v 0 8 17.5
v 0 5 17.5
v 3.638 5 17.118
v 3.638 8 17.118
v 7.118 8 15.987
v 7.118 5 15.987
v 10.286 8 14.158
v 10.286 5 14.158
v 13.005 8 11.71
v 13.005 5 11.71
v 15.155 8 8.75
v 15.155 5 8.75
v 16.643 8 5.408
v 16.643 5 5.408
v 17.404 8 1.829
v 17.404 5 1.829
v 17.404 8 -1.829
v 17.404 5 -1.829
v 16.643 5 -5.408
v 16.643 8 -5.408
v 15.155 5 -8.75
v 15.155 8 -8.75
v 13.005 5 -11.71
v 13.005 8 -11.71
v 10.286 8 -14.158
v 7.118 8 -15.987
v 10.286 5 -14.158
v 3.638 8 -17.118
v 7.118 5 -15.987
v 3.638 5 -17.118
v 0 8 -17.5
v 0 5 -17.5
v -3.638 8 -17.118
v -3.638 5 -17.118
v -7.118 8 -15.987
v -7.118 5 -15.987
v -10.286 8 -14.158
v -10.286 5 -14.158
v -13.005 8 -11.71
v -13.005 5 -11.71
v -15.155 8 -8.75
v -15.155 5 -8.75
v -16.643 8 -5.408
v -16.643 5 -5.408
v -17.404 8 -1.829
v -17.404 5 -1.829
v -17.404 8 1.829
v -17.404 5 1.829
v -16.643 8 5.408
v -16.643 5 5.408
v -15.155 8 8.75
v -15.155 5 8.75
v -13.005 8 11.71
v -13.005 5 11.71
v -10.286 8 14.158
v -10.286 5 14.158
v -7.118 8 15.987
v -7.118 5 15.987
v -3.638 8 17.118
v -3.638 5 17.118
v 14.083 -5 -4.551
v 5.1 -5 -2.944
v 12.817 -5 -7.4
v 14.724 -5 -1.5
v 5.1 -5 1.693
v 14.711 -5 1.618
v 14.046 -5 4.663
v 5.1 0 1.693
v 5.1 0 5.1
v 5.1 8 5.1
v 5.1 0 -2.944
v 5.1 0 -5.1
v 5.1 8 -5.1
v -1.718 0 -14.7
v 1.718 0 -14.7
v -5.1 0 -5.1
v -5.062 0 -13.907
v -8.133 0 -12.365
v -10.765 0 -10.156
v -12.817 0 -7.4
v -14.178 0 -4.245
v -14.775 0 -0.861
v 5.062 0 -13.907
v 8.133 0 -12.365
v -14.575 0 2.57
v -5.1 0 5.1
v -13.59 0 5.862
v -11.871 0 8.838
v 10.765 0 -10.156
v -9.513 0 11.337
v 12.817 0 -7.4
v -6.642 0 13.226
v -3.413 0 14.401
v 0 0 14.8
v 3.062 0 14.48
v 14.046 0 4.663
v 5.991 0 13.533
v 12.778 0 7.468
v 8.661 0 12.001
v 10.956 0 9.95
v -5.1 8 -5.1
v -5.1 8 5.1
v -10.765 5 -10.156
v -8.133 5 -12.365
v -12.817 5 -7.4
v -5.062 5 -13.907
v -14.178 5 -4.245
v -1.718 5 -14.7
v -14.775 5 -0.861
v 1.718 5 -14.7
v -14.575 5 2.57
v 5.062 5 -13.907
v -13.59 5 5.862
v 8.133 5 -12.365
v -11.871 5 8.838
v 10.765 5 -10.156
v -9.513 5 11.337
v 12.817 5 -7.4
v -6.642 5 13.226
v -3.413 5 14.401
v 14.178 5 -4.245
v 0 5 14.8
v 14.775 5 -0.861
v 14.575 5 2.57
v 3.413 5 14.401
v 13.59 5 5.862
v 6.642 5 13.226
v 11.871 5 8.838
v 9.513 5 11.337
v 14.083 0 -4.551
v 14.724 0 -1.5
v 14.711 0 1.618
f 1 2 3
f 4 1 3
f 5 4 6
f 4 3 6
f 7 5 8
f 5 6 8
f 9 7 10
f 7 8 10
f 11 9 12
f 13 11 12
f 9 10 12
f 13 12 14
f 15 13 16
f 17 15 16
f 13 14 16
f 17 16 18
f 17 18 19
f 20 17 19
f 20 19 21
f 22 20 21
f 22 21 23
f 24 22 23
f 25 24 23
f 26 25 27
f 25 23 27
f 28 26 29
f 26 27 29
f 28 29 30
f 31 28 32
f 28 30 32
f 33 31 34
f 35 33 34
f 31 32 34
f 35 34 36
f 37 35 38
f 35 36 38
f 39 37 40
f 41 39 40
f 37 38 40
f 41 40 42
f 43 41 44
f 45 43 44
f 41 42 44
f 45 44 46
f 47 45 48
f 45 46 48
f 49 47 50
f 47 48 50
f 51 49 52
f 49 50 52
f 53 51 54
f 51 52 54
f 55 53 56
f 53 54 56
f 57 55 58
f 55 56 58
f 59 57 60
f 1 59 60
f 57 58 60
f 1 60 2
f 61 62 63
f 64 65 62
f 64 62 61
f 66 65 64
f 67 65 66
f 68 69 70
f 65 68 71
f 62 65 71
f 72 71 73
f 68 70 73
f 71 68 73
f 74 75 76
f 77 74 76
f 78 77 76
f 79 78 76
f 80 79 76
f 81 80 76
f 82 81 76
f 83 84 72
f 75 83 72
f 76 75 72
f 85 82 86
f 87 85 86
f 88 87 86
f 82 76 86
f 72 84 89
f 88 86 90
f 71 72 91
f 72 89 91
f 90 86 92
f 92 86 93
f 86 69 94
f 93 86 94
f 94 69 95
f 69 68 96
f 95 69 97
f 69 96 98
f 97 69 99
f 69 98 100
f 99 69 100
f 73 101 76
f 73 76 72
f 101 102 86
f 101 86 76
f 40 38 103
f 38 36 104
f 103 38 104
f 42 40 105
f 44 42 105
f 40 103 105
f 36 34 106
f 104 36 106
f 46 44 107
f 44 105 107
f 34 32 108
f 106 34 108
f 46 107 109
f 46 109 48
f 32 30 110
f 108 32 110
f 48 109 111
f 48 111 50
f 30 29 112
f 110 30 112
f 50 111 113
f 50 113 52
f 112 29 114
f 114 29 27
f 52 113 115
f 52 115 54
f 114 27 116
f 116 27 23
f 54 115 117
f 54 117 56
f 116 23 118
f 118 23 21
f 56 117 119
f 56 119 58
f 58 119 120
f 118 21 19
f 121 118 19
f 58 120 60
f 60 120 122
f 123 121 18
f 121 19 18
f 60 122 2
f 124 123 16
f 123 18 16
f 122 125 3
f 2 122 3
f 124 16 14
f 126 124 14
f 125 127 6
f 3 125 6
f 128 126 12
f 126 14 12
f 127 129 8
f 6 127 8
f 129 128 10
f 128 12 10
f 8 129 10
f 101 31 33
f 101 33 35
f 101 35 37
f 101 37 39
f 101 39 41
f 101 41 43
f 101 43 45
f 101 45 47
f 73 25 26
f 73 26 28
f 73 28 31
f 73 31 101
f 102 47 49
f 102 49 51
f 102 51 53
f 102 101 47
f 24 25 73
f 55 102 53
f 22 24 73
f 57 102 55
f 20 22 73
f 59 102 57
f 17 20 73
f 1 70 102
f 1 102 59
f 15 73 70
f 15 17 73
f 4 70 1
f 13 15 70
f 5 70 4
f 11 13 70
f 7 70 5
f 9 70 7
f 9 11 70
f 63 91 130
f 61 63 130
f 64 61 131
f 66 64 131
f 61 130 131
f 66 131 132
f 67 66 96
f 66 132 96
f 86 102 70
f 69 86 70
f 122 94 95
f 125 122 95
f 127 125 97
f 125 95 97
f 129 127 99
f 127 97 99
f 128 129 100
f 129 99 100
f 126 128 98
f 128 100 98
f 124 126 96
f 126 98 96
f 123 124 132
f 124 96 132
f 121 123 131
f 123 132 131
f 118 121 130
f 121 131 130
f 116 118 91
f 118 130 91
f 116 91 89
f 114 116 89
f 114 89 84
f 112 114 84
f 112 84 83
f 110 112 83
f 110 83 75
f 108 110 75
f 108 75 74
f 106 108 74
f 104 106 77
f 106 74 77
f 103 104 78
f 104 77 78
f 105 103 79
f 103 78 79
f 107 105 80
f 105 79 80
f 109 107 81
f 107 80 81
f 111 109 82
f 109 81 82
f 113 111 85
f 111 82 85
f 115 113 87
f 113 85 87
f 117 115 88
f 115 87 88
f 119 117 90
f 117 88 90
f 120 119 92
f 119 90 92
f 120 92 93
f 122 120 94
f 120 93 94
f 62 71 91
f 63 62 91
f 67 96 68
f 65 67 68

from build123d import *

# Parameters (mm, degrees)
SKETCH_1_R          = 14.8
EXTRUDE_1_DEPTH     = 5
SKETCH_2_R          = 17.5
EXTRUDE_2_DEPTH     = 3
SKETCH_3_W          = 10.2
SKETCH_3_H          = 10.2
CUT_EXTRUDE_1_DEPTH = 9
EXTRUDE_3_DEPTH     = 5


with BuildPart() as part:
    # Эскиз1 → Бобышка-Вытянуть1 (new body)
    with BuildSketch(Plane(origin=(0, 0, 0), x_dir=(1, 0, 0), z_dir=(0, 1, 0))):
        with Locations(Location((0, 0, 0), (0, 0, 270))):  # turned: the seam where the file's is
            Circle(SKETCH_1_R)
    extrude(amount=EXTRUDE_1_DEPTH)

    # Эскиз2 → Бобышка-Вытянуть2 (add)
    with BuildSketch(Plane(origin=(0, 5, 0), x_dir=(1, 0, 0), z_dir=(0, 1, 0))):
        with Locations(Location((0, 0, 0), (0, 0, 270))):  # turned: the seam where the file's is
            Circle(SKETCH_2_R)
    extrude(amount=EXTRUDE_2_DEPTH)

    # Эскиз3 → Вырез-Вытянуть1 (cut, through all)
    with BuildSketch(Plane(origin=(0, 8, 0), x_dir=(1, 0, 0), z_dir=(0, 1, 0))):
        Rectangle(SKETCH_3_W, SKETCH_3_H)
    extrude(amount=-CUT_EXTRUDE_1_DEPTH, mode=Mode.SUBTRACT)

    # Эскиз4 → Бобышка-Вытянуть3 (add)
    with BuildSketch(Plane.XZ):
        with BuildLine():
            Line((14.046133482, 4.663275051), (5.1, 1.693185017))
            Line((5.1, 1.693185017), (5.1, -2.944486373))
            Line((5.1, -2.944486373), (12.817175976, -7.4))
            ThreePointArc((12.817175976, -7.4), (14.723790273, -1.5), (14.046133482, 4.663275051))
        make_face()
    extrude(amount=EXTRUDE_3_DEPTH)


solid = part.part
